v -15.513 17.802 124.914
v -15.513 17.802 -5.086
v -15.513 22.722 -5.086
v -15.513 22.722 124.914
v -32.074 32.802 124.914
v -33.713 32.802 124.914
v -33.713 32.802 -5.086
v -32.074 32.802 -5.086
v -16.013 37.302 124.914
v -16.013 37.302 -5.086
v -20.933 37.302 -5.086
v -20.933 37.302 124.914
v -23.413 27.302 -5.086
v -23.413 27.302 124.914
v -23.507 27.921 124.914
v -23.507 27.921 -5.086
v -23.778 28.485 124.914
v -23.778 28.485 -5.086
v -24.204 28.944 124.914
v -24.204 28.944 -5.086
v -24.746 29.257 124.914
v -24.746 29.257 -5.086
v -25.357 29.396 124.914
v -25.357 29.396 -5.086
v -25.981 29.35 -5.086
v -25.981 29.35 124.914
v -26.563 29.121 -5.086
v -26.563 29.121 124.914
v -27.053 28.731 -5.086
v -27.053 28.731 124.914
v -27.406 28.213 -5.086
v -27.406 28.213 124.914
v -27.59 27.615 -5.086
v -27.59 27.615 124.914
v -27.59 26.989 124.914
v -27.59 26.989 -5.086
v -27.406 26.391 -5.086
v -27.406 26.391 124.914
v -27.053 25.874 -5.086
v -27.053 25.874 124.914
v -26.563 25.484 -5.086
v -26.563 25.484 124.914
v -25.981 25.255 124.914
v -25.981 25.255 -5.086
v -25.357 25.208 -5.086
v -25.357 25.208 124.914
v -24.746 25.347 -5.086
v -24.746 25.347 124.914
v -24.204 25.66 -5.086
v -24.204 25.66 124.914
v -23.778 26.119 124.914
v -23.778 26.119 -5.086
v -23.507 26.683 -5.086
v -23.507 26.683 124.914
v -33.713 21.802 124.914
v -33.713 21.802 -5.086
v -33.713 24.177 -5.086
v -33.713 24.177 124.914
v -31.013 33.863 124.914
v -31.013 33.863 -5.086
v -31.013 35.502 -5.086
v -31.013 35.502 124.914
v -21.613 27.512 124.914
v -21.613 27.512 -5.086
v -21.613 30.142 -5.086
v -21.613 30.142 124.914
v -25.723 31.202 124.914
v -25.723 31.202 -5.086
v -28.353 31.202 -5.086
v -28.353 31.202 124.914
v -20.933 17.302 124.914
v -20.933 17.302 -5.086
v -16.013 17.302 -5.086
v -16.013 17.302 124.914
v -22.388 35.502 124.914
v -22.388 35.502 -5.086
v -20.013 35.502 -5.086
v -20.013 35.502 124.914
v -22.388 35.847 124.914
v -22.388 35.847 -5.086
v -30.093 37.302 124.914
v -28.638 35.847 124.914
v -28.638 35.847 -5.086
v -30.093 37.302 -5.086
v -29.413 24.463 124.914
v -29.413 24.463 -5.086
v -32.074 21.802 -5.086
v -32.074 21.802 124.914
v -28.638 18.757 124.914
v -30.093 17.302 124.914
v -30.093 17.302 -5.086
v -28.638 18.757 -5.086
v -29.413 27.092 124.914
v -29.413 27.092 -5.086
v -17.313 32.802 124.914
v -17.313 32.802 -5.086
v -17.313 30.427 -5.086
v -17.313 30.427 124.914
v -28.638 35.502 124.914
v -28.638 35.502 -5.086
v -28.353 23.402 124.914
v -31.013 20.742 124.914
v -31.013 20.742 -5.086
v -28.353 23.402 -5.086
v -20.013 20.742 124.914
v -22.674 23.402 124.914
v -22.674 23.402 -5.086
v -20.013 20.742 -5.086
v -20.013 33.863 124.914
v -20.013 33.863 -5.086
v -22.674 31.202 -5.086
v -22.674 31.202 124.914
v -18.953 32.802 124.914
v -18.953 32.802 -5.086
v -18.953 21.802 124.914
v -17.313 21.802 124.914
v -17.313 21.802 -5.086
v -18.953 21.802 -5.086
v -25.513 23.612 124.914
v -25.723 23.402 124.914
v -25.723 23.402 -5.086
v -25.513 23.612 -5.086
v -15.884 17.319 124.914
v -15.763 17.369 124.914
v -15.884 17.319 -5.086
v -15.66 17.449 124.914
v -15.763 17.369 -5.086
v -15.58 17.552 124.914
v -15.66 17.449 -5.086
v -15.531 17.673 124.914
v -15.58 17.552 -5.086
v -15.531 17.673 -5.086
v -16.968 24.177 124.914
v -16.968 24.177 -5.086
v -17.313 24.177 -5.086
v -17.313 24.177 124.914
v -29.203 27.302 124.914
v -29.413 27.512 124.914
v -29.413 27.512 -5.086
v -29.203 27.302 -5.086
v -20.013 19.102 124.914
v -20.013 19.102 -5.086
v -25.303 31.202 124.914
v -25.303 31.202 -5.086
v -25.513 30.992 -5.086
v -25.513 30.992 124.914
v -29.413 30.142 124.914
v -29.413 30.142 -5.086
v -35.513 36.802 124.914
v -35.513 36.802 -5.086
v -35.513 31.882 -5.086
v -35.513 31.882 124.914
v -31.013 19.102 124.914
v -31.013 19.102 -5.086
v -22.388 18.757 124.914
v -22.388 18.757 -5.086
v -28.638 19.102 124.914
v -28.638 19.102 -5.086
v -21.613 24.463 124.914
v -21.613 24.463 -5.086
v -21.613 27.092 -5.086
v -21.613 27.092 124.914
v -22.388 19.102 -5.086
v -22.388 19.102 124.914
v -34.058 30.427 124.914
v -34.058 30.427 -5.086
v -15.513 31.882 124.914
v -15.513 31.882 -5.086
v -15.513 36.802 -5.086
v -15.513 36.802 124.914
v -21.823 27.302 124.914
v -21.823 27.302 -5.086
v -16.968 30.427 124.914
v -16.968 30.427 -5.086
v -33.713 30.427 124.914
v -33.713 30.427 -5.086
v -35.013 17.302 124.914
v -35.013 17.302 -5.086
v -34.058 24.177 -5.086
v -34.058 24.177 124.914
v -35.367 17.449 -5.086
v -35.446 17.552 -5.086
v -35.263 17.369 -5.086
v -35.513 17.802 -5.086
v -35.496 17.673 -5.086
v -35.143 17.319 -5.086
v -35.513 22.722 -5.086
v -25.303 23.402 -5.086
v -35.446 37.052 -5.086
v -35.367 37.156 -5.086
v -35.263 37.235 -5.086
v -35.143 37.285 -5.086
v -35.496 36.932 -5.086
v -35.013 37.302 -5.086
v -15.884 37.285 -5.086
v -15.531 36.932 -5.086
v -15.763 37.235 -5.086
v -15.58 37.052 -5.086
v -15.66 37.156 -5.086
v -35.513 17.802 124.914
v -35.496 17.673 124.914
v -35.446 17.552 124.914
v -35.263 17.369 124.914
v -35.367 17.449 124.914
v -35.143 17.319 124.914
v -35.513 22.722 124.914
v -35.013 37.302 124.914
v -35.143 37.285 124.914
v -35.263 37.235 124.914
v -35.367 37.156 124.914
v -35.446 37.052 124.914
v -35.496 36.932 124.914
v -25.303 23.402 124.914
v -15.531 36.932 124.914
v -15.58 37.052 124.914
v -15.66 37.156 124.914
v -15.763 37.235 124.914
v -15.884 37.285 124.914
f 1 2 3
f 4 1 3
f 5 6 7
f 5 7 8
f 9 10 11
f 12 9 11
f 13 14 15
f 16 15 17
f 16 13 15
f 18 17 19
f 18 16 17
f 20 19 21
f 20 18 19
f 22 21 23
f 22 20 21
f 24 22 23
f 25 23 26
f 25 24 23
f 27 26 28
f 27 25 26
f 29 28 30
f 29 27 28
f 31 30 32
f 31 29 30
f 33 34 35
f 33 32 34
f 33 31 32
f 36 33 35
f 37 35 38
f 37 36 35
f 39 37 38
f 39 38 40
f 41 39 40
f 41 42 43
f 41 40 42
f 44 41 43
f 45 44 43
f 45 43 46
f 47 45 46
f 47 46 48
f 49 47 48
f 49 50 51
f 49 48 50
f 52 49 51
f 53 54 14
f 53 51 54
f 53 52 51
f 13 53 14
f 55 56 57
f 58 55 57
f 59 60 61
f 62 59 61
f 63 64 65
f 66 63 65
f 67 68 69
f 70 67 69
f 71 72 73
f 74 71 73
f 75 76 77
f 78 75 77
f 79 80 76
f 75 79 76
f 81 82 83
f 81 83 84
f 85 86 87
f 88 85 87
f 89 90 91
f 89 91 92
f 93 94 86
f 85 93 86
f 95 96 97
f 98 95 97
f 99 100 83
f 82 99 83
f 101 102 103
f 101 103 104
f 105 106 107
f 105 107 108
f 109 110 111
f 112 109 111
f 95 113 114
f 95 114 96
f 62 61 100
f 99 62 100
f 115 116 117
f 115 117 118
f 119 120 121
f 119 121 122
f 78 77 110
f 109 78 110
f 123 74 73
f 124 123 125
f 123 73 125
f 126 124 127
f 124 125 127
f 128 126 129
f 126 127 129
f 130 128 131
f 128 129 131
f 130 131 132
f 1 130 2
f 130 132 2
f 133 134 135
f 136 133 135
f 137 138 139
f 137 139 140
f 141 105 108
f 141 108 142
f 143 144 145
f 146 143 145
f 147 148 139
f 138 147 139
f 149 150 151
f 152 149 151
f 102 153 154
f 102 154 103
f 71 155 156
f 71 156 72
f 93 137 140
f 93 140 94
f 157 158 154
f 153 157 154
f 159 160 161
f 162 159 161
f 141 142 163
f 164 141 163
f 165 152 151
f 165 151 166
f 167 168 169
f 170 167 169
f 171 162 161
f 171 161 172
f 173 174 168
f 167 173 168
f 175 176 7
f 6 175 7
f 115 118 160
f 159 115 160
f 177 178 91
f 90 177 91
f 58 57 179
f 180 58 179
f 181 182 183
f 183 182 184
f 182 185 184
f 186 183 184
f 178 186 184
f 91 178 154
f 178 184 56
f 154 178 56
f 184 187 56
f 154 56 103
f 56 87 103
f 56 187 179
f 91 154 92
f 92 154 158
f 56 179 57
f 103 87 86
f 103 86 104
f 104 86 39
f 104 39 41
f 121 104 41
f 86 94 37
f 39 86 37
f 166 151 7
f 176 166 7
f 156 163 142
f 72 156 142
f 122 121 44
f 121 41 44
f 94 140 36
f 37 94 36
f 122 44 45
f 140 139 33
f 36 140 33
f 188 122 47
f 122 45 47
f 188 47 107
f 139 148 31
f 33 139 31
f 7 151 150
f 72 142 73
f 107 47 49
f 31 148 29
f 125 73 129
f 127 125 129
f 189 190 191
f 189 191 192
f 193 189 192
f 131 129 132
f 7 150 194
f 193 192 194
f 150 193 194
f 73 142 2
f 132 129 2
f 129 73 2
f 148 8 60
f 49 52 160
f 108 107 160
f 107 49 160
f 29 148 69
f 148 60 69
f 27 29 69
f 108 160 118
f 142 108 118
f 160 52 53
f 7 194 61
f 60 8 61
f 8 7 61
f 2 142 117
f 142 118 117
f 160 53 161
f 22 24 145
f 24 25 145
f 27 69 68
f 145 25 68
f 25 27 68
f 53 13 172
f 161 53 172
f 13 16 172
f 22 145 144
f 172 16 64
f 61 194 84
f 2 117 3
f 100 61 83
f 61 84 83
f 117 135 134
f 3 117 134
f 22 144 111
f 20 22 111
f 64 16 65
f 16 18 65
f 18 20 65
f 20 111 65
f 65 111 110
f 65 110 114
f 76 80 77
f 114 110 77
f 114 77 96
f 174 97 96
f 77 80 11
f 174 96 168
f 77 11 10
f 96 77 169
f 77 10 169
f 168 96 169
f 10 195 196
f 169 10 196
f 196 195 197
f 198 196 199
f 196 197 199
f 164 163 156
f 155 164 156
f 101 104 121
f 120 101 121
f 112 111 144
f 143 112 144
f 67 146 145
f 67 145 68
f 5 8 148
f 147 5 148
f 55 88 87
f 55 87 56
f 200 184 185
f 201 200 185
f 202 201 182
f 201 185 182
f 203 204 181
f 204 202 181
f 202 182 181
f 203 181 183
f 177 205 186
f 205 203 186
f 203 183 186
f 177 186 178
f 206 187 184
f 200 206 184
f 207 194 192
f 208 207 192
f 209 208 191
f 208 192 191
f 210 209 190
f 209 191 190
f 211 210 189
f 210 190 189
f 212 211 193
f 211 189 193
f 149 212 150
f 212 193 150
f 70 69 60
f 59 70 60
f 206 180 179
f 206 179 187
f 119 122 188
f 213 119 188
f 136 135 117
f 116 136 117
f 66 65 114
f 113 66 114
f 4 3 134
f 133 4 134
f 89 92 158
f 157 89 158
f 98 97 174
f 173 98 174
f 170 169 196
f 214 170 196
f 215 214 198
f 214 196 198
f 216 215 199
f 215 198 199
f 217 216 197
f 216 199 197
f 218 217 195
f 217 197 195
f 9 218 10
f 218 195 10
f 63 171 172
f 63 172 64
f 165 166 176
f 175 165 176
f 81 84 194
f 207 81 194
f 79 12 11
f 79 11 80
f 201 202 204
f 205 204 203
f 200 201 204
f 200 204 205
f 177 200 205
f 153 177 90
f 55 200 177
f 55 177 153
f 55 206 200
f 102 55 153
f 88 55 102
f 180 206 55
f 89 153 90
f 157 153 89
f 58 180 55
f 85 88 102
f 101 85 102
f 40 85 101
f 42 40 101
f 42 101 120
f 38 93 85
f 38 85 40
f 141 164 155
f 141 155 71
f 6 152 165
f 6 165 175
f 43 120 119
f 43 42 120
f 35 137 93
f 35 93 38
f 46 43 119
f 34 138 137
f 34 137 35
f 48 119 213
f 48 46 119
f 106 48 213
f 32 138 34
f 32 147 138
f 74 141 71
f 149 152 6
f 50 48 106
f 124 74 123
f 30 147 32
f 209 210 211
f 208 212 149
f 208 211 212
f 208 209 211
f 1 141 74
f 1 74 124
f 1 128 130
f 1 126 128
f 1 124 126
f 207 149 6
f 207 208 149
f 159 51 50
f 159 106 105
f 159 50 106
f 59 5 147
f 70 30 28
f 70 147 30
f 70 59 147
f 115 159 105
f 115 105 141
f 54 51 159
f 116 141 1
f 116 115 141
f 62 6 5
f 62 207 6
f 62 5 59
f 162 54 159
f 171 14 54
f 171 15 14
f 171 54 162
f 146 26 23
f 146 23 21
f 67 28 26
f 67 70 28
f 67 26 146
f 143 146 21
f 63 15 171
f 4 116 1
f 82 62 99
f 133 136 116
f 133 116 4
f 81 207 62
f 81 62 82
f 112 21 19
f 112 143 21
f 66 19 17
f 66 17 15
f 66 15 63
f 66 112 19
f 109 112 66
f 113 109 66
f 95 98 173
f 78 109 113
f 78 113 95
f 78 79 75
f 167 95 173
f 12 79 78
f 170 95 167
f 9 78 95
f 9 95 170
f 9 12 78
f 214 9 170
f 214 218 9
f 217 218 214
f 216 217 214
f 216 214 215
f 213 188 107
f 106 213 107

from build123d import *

# Parameters (mm, degrees)
V_SLOT_START                           = -5.085646751
V_SLOT_20X20X500_LINEAR_RAIL_OUTLINE_R = 2.1
V_SLOT_20X20X500_LINEAR_RAIL_DEPTH     = 500
SKETCH1_W                              = 20
SKETCH1_H                              = 370
CUT_EXTRUDE1_DEPTH                     = 497.589794047


# Read off the part's stored shape, not the designer's step: V-Slot 20x20x500 Linear Rail
with BuildPart() as part:
    # V-Slot 20x20x500 Linear Rail outline → V-Slot 20x20x500 Linear Rail (new body)
    with BuildSketch(Plane.XY.offset(V_SLOT_START)):
        with BuildLine():
            Line((-21.613469268, 24.462926439), (-21.613469268, 27.092266268))
            Line((-21.613469268, 27.092266268), (-21.823469268, 27.302266268))
            Line((-21.823469268, 27.302266268), (-21.613469268, 27.512266268))
            Line((-21.613469268, 27.512266268), (-21.613469268, 30.141606096))
            Line((-21.613469268, 30.141606096), (-18.952809096, 32.802266268))
            Line((-18.952809096, 32.802266268), (-17.313469268, 32.802266268))
            Line((-17.313469268, 32.802266268), (-17.313469268, 30.427266268))
            Line((-17.313469268, 30.427266268), (-16.968469268, 30.427266268))
            Line((-16.968469268, 30.427266268), (-15.513469268, 31.882266268))
            Line((-15.513469268, 31.882266268), (-15.513469268, 36.802266268))
            ThreePointArc((-15.513469268, 36.802266268), (-15.659915878, 37.155819658), (-16.013469268, 37.302266268))
            Line((-16.013469268, 37.302266268), (-20.933469268, 37.302266268))
            Line((-20.933469268, 37.302266268), (-22.388469268, 35.847266268))
            Line((-22.388469268, 35.847266268), (-22.388469268, 35.502266268))
            Line((-22.388469268, 35.502266268), (-20.013469268, 35.502266268))
            Line((-20.013469268, 35.502266268), (-20.013469268, 33.862926439))
            Line((-20.013469268, 33.862926439), (-22.67412944, 31.202266268))
            Line((-22.67412944, 31.202266268), (-25.303469268, 31.202266268))
            Line((-25.303469268, 31.202266268), (-25.513469268, 30.992266268))
            Line((-25.513469268, 30.992266268), (-25.723469268, 31.202266268))
            Line((-25.723469268, 31.202266268), (-28.352809096, 31.202266268))
            Line((-28.352809096, 31.202266268), (-31.013469268, 33.862926439))
            Line((-31.013469268, 33.862926439), (-31.013469268, 35.502266268))
            Line((-31.013469268, 35.502266268), (-28.638469268, 35.502266268))
            Line((-28.638469268, 35.502266268), (-28.638469268, 35.847266268))
            Line((-28.638469268, 35.847266268), (-30.093469268, 37.302266268))
            Line((-30.093469268, 37.302266268), (-35.013469268, 37.302266268))
            ThreePointArc((-35.013469268, 37.302266268), (-35.367022659, 37.155819658), (-35.513469268, 36.802266268))
            Line((-35.513469268, 36.802266268), (-35.513469268, 31.882266268))
            Line((-35.513469268, 31.882266268), (-34.058469268, 30.427266268))
            Line((-34.058469268, 30.427266268), (-33.713469268, 30.427266268))
            Line((-33.713469268, 30.427266268), (-33.713469268, 32.802266268))
            Line((-33.713469268, 32.802266268), (-32.07412944, 32.802266268))
            Line((-32.07412944, 32.802266268), (-29.413469268, 30.141606096))
            Line((-29.413469268, 30.141606096), (-29.413469268, 27.512266268))
            Line((-29.413469268, 27.512266268), (-29.203469268, 27.302266268))
            Line((-29.203469268, 27.302266268), (-29.413469268, 27.092266268))
            Line((-29.413469268, 27.092266268), (-29.413469268, 24.462926439))
            Line((-29.413469268, 24.462926439), (-32.07412944, 21.802266268))
            Line((-32.07412944, 21.802266268), (-33.713469268, 21.802266268))
            Line((-33.713469268, 21.802266268), (-33.713469268, 24.177266268))
            Line((-33.713469268, 24.177266268), (-34.058469268, 24.177266268))
            Line((-34.058469268, 24.177266268), (-35.513469268, 22.722266268))
            Line((-35.513469268, 22.722266268), (-35.513469268, 17.802266268))
            ThreePointArc((-35.513469268, 17.802266268), (-35.367022659, 17.448712877), (-35.013469268, 17.302266268))
            Line((-35.013469268, 17.302266268), (-30.093469268, 17.302266268))
            Line((-30.093469268, 17.302266268), (-28.638469268, 18.757266268))
            Line((-28.638469268, 18.757266268), (-28.638469268, 19.102266268))
            Line((-28.638469268, 19.102266268), (-31.013469268, 19.102266268))
            Line((-31.013469268, 19.102266268), (-31.013469268, 20.741606096))
            Line((-31.013469268, 20.741606096), (-28.352809096, 23.402266268))
            Line((-28.352809096, 23.402266268), (-25.723469268, 23.402266268))
            Line((-25.723469268, 23.402266268), (-25.513469268, 23.612266268))
            Line((-25.513469268, 23.612266268), (-25.303469268, 23.402266268))
            Line((-25.303469268, 23.402266268), (-22.67412944, 23.402266268))
            Line((-22.67412944, 23.402266268), (-20.013469268, 20.741606096))
            Line((-20.013469268, 20.741606096), (-20.013469268, 19.102266268))
            Line((-20.013469268, 19.102266268), (-22.388469268, 19.102266268))
            Line((-22.388469268, 19.102266268), (-22.388469268, 18.757266268))
            Line((-22.388469268, 18.757266268), (-20.933469268, 17.302266268))
            Line((-20.933469268, 17.302266268), (-16.013469268, 17.302266268))
            ThreePointArc((-16.013469268, 17.302266268), (-15.659915877, 17.448712878), (-15.513469268, 17.802266268))
            Line((-15.513469268, 17.802266268), (-15.513469268, 22.722266268))
            Line((-15.513469268, 22.722266268), (-16.968469268, 24.177266268))
            Line((-16.968469268, 24.177266268), (-17.313469268, 24.177266268))
            Line((-17.313469268, 24.177266268), (-17.313469268, 21.802266268))
            Line((-17.313469268, 21.802266268), (-18.952809096, 21.802266268))
            Line((-18.952809096, 21.802266268), (-21.613469268, 24.462926439))
        make_face()
        with Locations((-25.513469268, 27.302266268)):
            Circle(V_SLOT_20X20X500_LINEAR_RAIL_OUTLINE_R, mode=Mode.SUBTRACT)
    extrude(amount=V_SLOT_20X20X500_LINEAR_RAIL_DEPTH)

    # Sketch1 → Cut-Extrude1 (cut, through all)
    with BuildSketch(Plane(origin=(0, 37.302266268, 0), x_dir=(1, 0, 0), z_dir=(0, 1, 0))):
        with Locations((-25.513469268, -309.914353249)):
            Rectangle(SKETCH1_W, SKETCH1_H)
    extrude(amount=-CUT_EXTRUDE1_DEPTH, mode=Mode.SUBTRACT)


solid = part.part
